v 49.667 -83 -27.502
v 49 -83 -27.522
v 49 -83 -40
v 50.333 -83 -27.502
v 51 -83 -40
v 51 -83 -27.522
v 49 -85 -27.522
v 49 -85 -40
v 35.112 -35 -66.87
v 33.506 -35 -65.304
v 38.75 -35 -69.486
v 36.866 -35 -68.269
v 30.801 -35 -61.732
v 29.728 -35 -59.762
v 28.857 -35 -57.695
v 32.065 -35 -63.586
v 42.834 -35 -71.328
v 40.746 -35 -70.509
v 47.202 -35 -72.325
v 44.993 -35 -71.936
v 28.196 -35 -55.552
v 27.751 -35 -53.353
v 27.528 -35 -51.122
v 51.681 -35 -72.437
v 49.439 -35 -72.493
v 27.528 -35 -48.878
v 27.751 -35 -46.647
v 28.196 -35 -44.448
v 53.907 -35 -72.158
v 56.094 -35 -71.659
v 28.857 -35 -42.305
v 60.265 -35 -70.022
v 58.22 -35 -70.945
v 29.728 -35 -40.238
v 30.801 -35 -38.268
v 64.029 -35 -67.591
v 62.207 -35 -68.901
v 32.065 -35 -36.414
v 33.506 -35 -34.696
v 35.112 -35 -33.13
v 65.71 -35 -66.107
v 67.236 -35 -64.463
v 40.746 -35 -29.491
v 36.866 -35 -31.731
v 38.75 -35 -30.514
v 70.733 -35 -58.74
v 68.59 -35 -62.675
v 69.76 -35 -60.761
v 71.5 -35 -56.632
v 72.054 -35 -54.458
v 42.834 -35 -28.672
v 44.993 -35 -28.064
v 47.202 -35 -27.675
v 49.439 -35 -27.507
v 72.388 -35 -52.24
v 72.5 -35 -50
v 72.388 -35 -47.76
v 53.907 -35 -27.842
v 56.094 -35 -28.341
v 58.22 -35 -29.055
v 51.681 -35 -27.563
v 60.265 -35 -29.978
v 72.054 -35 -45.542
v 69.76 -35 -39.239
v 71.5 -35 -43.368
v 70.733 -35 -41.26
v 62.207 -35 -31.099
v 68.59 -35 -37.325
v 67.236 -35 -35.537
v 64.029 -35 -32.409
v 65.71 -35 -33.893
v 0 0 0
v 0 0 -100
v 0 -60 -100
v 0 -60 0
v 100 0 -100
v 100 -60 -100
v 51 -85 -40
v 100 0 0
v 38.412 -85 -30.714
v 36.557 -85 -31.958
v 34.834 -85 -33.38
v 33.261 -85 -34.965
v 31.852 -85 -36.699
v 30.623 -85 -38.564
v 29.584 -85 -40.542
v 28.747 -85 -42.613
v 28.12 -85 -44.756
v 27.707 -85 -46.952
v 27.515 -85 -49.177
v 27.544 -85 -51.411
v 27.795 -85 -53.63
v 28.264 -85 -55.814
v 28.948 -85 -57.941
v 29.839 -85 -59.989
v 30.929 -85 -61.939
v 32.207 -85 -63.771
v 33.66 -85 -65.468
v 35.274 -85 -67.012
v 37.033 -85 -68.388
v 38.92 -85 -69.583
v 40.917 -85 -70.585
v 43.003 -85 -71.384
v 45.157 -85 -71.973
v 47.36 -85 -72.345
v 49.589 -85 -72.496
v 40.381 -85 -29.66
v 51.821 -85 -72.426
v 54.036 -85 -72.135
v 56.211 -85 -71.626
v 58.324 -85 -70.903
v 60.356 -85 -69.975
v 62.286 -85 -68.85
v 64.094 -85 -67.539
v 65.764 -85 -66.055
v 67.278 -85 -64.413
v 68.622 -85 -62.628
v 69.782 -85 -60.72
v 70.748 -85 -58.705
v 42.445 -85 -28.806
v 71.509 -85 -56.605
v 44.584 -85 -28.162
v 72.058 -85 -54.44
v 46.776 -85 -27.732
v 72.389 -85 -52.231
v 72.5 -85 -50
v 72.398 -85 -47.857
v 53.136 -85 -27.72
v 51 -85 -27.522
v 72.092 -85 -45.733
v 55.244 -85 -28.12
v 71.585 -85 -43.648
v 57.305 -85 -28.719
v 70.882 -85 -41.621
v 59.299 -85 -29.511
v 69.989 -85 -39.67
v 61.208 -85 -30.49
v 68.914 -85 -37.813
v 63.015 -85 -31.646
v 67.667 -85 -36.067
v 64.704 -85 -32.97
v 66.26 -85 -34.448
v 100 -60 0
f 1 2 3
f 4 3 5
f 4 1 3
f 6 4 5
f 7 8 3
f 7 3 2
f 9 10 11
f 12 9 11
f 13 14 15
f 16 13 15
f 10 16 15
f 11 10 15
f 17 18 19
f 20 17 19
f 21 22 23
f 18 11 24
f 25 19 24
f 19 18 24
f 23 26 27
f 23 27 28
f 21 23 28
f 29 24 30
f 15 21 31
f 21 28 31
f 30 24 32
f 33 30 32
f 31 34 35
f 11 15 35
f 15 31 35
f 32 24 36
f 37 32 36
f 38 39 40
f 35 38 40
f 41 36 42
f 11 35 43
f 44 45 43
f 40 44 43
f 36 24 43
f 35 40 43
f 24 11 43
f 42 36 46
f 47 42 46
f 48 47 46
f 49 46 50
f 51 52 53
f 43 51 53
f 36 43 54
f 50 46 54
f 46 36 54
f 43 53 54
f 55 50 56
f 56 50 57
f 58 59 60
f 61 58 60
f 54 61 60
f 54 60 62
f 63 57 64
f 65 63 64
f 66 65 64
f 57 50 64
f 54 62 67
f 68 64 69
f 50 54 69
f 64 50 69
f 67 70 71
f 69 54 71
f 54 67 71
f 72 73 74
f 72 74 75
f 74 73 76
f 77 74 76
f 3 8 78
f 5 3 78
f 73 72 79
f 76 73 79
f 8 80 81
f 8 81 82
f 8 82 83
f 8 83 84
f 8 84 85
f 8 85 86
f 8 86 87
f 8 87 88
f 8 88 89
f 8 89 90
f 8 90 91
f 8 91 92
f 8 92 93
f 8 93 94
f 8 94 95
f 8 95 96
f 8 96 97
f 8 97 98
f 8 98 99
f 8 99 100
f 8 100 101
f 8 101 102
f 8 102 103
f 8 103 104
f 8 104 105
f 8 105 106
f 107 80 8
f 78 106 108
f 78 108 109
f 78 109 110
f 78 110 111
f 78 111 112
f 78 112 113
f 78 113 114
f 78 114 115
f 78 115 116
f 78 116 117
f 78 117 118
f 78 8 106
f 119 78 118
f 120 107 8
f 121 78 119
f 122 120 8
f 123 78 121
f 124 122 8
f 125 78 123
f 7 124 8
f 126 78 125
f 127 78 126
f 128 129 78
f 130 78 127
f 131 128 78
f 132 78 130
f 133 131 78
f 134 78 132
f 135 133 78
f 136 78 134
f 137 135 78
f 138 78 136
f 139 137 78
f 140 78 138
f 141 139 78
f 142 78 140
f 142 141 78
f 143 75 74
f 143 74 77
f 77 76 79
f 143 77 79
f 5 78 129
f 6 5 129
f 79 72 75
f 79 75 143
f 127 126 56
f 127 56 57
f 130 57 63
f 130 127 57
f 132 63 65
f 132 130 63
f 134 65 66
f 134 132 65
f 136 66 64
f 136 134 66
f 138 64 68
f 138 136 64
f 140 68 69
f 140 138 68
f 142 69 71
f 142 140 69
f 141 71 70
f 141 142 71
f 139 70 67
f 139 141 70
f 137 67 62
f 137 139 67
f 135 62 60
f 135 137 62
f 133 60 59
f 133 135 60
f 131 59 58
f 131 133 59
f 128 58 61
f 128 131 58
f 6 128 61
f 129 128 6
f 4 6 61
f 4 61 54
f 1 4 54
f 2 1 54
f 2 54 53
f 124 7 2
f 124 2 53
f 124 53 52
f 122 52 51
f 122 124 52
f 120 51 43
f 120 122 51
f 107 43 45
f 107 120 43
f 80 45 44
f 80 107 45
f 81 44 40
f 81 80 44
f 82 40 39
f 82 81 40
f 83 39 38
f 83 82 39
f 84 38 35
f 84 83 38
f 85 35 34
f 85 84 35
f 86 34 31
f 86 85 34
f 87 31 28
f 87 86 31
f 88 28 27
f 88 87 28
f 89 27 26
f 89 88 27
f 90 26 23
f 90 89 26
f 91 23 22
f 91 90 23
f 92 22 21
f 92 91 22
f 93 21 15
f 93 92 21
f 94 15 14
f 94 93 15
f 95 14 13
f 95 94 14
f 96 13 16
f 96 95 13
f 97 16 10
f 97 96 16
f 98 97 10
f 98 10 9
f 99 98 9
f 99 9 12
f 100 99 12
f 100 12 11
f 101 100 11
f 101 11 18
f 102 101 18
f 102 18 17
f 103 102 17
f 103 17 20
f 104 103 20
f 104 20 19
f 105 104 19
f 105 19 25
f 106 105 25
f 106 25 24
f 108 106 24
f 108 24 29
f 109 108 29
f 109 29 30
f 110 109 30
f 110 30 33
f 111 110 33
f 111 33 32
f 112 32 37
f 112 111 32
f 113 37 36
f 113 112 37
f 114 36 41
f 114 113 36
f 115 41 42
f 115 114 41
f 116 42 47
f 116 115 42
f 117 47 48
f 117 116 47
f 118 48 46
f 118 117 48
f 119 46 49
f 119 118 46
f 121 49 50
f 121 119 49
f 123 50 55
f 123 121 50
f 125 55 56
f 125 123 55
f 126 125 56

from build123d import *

# Parameters (mm, degrees)
F0_W          = 100
F0_H          = 100
F1_DEPTH      = 60
F2_R          = 22.5
F3_DEPTH      = 25
F3_DEPTH_BACK = 25
F4_W          = 2
F4_H          = 25
F5_DEPTH      = 2


with BuildPart() as f1:
    # F0 (on Front) → F1 (new body)
    with BuildSketch(Plane.XZ):
        with Locations((50, -50)):
            Rectangle(F0_W, F0_H)
    extrude(amount=F1_DEPTH)


with BuildPart() as f3:
    # F2 (on face) → F3 (new body, two sides)
    with BuildSketch(Plane.XZ.offset(60)) as f3_sk:
        with Locations((50, -50)):
            Circle(F2_R)
    extrude(amount=F3_DEPTH)
    extrude(f3_sk.sketch, amount=-F3_DEPTH_BACK)

    # F4 (on face) → F5 (cut)
    with BuildSketch(Plane.XZ.offset(85)):
        with Locations((50, -27.5)):
            Rectangle(F4_W, F4_H)
    extrude(amount=-F5_DEPTH, mode=Mode.SUBTRACT)


solid = Compound([f1.part, f3.part])
